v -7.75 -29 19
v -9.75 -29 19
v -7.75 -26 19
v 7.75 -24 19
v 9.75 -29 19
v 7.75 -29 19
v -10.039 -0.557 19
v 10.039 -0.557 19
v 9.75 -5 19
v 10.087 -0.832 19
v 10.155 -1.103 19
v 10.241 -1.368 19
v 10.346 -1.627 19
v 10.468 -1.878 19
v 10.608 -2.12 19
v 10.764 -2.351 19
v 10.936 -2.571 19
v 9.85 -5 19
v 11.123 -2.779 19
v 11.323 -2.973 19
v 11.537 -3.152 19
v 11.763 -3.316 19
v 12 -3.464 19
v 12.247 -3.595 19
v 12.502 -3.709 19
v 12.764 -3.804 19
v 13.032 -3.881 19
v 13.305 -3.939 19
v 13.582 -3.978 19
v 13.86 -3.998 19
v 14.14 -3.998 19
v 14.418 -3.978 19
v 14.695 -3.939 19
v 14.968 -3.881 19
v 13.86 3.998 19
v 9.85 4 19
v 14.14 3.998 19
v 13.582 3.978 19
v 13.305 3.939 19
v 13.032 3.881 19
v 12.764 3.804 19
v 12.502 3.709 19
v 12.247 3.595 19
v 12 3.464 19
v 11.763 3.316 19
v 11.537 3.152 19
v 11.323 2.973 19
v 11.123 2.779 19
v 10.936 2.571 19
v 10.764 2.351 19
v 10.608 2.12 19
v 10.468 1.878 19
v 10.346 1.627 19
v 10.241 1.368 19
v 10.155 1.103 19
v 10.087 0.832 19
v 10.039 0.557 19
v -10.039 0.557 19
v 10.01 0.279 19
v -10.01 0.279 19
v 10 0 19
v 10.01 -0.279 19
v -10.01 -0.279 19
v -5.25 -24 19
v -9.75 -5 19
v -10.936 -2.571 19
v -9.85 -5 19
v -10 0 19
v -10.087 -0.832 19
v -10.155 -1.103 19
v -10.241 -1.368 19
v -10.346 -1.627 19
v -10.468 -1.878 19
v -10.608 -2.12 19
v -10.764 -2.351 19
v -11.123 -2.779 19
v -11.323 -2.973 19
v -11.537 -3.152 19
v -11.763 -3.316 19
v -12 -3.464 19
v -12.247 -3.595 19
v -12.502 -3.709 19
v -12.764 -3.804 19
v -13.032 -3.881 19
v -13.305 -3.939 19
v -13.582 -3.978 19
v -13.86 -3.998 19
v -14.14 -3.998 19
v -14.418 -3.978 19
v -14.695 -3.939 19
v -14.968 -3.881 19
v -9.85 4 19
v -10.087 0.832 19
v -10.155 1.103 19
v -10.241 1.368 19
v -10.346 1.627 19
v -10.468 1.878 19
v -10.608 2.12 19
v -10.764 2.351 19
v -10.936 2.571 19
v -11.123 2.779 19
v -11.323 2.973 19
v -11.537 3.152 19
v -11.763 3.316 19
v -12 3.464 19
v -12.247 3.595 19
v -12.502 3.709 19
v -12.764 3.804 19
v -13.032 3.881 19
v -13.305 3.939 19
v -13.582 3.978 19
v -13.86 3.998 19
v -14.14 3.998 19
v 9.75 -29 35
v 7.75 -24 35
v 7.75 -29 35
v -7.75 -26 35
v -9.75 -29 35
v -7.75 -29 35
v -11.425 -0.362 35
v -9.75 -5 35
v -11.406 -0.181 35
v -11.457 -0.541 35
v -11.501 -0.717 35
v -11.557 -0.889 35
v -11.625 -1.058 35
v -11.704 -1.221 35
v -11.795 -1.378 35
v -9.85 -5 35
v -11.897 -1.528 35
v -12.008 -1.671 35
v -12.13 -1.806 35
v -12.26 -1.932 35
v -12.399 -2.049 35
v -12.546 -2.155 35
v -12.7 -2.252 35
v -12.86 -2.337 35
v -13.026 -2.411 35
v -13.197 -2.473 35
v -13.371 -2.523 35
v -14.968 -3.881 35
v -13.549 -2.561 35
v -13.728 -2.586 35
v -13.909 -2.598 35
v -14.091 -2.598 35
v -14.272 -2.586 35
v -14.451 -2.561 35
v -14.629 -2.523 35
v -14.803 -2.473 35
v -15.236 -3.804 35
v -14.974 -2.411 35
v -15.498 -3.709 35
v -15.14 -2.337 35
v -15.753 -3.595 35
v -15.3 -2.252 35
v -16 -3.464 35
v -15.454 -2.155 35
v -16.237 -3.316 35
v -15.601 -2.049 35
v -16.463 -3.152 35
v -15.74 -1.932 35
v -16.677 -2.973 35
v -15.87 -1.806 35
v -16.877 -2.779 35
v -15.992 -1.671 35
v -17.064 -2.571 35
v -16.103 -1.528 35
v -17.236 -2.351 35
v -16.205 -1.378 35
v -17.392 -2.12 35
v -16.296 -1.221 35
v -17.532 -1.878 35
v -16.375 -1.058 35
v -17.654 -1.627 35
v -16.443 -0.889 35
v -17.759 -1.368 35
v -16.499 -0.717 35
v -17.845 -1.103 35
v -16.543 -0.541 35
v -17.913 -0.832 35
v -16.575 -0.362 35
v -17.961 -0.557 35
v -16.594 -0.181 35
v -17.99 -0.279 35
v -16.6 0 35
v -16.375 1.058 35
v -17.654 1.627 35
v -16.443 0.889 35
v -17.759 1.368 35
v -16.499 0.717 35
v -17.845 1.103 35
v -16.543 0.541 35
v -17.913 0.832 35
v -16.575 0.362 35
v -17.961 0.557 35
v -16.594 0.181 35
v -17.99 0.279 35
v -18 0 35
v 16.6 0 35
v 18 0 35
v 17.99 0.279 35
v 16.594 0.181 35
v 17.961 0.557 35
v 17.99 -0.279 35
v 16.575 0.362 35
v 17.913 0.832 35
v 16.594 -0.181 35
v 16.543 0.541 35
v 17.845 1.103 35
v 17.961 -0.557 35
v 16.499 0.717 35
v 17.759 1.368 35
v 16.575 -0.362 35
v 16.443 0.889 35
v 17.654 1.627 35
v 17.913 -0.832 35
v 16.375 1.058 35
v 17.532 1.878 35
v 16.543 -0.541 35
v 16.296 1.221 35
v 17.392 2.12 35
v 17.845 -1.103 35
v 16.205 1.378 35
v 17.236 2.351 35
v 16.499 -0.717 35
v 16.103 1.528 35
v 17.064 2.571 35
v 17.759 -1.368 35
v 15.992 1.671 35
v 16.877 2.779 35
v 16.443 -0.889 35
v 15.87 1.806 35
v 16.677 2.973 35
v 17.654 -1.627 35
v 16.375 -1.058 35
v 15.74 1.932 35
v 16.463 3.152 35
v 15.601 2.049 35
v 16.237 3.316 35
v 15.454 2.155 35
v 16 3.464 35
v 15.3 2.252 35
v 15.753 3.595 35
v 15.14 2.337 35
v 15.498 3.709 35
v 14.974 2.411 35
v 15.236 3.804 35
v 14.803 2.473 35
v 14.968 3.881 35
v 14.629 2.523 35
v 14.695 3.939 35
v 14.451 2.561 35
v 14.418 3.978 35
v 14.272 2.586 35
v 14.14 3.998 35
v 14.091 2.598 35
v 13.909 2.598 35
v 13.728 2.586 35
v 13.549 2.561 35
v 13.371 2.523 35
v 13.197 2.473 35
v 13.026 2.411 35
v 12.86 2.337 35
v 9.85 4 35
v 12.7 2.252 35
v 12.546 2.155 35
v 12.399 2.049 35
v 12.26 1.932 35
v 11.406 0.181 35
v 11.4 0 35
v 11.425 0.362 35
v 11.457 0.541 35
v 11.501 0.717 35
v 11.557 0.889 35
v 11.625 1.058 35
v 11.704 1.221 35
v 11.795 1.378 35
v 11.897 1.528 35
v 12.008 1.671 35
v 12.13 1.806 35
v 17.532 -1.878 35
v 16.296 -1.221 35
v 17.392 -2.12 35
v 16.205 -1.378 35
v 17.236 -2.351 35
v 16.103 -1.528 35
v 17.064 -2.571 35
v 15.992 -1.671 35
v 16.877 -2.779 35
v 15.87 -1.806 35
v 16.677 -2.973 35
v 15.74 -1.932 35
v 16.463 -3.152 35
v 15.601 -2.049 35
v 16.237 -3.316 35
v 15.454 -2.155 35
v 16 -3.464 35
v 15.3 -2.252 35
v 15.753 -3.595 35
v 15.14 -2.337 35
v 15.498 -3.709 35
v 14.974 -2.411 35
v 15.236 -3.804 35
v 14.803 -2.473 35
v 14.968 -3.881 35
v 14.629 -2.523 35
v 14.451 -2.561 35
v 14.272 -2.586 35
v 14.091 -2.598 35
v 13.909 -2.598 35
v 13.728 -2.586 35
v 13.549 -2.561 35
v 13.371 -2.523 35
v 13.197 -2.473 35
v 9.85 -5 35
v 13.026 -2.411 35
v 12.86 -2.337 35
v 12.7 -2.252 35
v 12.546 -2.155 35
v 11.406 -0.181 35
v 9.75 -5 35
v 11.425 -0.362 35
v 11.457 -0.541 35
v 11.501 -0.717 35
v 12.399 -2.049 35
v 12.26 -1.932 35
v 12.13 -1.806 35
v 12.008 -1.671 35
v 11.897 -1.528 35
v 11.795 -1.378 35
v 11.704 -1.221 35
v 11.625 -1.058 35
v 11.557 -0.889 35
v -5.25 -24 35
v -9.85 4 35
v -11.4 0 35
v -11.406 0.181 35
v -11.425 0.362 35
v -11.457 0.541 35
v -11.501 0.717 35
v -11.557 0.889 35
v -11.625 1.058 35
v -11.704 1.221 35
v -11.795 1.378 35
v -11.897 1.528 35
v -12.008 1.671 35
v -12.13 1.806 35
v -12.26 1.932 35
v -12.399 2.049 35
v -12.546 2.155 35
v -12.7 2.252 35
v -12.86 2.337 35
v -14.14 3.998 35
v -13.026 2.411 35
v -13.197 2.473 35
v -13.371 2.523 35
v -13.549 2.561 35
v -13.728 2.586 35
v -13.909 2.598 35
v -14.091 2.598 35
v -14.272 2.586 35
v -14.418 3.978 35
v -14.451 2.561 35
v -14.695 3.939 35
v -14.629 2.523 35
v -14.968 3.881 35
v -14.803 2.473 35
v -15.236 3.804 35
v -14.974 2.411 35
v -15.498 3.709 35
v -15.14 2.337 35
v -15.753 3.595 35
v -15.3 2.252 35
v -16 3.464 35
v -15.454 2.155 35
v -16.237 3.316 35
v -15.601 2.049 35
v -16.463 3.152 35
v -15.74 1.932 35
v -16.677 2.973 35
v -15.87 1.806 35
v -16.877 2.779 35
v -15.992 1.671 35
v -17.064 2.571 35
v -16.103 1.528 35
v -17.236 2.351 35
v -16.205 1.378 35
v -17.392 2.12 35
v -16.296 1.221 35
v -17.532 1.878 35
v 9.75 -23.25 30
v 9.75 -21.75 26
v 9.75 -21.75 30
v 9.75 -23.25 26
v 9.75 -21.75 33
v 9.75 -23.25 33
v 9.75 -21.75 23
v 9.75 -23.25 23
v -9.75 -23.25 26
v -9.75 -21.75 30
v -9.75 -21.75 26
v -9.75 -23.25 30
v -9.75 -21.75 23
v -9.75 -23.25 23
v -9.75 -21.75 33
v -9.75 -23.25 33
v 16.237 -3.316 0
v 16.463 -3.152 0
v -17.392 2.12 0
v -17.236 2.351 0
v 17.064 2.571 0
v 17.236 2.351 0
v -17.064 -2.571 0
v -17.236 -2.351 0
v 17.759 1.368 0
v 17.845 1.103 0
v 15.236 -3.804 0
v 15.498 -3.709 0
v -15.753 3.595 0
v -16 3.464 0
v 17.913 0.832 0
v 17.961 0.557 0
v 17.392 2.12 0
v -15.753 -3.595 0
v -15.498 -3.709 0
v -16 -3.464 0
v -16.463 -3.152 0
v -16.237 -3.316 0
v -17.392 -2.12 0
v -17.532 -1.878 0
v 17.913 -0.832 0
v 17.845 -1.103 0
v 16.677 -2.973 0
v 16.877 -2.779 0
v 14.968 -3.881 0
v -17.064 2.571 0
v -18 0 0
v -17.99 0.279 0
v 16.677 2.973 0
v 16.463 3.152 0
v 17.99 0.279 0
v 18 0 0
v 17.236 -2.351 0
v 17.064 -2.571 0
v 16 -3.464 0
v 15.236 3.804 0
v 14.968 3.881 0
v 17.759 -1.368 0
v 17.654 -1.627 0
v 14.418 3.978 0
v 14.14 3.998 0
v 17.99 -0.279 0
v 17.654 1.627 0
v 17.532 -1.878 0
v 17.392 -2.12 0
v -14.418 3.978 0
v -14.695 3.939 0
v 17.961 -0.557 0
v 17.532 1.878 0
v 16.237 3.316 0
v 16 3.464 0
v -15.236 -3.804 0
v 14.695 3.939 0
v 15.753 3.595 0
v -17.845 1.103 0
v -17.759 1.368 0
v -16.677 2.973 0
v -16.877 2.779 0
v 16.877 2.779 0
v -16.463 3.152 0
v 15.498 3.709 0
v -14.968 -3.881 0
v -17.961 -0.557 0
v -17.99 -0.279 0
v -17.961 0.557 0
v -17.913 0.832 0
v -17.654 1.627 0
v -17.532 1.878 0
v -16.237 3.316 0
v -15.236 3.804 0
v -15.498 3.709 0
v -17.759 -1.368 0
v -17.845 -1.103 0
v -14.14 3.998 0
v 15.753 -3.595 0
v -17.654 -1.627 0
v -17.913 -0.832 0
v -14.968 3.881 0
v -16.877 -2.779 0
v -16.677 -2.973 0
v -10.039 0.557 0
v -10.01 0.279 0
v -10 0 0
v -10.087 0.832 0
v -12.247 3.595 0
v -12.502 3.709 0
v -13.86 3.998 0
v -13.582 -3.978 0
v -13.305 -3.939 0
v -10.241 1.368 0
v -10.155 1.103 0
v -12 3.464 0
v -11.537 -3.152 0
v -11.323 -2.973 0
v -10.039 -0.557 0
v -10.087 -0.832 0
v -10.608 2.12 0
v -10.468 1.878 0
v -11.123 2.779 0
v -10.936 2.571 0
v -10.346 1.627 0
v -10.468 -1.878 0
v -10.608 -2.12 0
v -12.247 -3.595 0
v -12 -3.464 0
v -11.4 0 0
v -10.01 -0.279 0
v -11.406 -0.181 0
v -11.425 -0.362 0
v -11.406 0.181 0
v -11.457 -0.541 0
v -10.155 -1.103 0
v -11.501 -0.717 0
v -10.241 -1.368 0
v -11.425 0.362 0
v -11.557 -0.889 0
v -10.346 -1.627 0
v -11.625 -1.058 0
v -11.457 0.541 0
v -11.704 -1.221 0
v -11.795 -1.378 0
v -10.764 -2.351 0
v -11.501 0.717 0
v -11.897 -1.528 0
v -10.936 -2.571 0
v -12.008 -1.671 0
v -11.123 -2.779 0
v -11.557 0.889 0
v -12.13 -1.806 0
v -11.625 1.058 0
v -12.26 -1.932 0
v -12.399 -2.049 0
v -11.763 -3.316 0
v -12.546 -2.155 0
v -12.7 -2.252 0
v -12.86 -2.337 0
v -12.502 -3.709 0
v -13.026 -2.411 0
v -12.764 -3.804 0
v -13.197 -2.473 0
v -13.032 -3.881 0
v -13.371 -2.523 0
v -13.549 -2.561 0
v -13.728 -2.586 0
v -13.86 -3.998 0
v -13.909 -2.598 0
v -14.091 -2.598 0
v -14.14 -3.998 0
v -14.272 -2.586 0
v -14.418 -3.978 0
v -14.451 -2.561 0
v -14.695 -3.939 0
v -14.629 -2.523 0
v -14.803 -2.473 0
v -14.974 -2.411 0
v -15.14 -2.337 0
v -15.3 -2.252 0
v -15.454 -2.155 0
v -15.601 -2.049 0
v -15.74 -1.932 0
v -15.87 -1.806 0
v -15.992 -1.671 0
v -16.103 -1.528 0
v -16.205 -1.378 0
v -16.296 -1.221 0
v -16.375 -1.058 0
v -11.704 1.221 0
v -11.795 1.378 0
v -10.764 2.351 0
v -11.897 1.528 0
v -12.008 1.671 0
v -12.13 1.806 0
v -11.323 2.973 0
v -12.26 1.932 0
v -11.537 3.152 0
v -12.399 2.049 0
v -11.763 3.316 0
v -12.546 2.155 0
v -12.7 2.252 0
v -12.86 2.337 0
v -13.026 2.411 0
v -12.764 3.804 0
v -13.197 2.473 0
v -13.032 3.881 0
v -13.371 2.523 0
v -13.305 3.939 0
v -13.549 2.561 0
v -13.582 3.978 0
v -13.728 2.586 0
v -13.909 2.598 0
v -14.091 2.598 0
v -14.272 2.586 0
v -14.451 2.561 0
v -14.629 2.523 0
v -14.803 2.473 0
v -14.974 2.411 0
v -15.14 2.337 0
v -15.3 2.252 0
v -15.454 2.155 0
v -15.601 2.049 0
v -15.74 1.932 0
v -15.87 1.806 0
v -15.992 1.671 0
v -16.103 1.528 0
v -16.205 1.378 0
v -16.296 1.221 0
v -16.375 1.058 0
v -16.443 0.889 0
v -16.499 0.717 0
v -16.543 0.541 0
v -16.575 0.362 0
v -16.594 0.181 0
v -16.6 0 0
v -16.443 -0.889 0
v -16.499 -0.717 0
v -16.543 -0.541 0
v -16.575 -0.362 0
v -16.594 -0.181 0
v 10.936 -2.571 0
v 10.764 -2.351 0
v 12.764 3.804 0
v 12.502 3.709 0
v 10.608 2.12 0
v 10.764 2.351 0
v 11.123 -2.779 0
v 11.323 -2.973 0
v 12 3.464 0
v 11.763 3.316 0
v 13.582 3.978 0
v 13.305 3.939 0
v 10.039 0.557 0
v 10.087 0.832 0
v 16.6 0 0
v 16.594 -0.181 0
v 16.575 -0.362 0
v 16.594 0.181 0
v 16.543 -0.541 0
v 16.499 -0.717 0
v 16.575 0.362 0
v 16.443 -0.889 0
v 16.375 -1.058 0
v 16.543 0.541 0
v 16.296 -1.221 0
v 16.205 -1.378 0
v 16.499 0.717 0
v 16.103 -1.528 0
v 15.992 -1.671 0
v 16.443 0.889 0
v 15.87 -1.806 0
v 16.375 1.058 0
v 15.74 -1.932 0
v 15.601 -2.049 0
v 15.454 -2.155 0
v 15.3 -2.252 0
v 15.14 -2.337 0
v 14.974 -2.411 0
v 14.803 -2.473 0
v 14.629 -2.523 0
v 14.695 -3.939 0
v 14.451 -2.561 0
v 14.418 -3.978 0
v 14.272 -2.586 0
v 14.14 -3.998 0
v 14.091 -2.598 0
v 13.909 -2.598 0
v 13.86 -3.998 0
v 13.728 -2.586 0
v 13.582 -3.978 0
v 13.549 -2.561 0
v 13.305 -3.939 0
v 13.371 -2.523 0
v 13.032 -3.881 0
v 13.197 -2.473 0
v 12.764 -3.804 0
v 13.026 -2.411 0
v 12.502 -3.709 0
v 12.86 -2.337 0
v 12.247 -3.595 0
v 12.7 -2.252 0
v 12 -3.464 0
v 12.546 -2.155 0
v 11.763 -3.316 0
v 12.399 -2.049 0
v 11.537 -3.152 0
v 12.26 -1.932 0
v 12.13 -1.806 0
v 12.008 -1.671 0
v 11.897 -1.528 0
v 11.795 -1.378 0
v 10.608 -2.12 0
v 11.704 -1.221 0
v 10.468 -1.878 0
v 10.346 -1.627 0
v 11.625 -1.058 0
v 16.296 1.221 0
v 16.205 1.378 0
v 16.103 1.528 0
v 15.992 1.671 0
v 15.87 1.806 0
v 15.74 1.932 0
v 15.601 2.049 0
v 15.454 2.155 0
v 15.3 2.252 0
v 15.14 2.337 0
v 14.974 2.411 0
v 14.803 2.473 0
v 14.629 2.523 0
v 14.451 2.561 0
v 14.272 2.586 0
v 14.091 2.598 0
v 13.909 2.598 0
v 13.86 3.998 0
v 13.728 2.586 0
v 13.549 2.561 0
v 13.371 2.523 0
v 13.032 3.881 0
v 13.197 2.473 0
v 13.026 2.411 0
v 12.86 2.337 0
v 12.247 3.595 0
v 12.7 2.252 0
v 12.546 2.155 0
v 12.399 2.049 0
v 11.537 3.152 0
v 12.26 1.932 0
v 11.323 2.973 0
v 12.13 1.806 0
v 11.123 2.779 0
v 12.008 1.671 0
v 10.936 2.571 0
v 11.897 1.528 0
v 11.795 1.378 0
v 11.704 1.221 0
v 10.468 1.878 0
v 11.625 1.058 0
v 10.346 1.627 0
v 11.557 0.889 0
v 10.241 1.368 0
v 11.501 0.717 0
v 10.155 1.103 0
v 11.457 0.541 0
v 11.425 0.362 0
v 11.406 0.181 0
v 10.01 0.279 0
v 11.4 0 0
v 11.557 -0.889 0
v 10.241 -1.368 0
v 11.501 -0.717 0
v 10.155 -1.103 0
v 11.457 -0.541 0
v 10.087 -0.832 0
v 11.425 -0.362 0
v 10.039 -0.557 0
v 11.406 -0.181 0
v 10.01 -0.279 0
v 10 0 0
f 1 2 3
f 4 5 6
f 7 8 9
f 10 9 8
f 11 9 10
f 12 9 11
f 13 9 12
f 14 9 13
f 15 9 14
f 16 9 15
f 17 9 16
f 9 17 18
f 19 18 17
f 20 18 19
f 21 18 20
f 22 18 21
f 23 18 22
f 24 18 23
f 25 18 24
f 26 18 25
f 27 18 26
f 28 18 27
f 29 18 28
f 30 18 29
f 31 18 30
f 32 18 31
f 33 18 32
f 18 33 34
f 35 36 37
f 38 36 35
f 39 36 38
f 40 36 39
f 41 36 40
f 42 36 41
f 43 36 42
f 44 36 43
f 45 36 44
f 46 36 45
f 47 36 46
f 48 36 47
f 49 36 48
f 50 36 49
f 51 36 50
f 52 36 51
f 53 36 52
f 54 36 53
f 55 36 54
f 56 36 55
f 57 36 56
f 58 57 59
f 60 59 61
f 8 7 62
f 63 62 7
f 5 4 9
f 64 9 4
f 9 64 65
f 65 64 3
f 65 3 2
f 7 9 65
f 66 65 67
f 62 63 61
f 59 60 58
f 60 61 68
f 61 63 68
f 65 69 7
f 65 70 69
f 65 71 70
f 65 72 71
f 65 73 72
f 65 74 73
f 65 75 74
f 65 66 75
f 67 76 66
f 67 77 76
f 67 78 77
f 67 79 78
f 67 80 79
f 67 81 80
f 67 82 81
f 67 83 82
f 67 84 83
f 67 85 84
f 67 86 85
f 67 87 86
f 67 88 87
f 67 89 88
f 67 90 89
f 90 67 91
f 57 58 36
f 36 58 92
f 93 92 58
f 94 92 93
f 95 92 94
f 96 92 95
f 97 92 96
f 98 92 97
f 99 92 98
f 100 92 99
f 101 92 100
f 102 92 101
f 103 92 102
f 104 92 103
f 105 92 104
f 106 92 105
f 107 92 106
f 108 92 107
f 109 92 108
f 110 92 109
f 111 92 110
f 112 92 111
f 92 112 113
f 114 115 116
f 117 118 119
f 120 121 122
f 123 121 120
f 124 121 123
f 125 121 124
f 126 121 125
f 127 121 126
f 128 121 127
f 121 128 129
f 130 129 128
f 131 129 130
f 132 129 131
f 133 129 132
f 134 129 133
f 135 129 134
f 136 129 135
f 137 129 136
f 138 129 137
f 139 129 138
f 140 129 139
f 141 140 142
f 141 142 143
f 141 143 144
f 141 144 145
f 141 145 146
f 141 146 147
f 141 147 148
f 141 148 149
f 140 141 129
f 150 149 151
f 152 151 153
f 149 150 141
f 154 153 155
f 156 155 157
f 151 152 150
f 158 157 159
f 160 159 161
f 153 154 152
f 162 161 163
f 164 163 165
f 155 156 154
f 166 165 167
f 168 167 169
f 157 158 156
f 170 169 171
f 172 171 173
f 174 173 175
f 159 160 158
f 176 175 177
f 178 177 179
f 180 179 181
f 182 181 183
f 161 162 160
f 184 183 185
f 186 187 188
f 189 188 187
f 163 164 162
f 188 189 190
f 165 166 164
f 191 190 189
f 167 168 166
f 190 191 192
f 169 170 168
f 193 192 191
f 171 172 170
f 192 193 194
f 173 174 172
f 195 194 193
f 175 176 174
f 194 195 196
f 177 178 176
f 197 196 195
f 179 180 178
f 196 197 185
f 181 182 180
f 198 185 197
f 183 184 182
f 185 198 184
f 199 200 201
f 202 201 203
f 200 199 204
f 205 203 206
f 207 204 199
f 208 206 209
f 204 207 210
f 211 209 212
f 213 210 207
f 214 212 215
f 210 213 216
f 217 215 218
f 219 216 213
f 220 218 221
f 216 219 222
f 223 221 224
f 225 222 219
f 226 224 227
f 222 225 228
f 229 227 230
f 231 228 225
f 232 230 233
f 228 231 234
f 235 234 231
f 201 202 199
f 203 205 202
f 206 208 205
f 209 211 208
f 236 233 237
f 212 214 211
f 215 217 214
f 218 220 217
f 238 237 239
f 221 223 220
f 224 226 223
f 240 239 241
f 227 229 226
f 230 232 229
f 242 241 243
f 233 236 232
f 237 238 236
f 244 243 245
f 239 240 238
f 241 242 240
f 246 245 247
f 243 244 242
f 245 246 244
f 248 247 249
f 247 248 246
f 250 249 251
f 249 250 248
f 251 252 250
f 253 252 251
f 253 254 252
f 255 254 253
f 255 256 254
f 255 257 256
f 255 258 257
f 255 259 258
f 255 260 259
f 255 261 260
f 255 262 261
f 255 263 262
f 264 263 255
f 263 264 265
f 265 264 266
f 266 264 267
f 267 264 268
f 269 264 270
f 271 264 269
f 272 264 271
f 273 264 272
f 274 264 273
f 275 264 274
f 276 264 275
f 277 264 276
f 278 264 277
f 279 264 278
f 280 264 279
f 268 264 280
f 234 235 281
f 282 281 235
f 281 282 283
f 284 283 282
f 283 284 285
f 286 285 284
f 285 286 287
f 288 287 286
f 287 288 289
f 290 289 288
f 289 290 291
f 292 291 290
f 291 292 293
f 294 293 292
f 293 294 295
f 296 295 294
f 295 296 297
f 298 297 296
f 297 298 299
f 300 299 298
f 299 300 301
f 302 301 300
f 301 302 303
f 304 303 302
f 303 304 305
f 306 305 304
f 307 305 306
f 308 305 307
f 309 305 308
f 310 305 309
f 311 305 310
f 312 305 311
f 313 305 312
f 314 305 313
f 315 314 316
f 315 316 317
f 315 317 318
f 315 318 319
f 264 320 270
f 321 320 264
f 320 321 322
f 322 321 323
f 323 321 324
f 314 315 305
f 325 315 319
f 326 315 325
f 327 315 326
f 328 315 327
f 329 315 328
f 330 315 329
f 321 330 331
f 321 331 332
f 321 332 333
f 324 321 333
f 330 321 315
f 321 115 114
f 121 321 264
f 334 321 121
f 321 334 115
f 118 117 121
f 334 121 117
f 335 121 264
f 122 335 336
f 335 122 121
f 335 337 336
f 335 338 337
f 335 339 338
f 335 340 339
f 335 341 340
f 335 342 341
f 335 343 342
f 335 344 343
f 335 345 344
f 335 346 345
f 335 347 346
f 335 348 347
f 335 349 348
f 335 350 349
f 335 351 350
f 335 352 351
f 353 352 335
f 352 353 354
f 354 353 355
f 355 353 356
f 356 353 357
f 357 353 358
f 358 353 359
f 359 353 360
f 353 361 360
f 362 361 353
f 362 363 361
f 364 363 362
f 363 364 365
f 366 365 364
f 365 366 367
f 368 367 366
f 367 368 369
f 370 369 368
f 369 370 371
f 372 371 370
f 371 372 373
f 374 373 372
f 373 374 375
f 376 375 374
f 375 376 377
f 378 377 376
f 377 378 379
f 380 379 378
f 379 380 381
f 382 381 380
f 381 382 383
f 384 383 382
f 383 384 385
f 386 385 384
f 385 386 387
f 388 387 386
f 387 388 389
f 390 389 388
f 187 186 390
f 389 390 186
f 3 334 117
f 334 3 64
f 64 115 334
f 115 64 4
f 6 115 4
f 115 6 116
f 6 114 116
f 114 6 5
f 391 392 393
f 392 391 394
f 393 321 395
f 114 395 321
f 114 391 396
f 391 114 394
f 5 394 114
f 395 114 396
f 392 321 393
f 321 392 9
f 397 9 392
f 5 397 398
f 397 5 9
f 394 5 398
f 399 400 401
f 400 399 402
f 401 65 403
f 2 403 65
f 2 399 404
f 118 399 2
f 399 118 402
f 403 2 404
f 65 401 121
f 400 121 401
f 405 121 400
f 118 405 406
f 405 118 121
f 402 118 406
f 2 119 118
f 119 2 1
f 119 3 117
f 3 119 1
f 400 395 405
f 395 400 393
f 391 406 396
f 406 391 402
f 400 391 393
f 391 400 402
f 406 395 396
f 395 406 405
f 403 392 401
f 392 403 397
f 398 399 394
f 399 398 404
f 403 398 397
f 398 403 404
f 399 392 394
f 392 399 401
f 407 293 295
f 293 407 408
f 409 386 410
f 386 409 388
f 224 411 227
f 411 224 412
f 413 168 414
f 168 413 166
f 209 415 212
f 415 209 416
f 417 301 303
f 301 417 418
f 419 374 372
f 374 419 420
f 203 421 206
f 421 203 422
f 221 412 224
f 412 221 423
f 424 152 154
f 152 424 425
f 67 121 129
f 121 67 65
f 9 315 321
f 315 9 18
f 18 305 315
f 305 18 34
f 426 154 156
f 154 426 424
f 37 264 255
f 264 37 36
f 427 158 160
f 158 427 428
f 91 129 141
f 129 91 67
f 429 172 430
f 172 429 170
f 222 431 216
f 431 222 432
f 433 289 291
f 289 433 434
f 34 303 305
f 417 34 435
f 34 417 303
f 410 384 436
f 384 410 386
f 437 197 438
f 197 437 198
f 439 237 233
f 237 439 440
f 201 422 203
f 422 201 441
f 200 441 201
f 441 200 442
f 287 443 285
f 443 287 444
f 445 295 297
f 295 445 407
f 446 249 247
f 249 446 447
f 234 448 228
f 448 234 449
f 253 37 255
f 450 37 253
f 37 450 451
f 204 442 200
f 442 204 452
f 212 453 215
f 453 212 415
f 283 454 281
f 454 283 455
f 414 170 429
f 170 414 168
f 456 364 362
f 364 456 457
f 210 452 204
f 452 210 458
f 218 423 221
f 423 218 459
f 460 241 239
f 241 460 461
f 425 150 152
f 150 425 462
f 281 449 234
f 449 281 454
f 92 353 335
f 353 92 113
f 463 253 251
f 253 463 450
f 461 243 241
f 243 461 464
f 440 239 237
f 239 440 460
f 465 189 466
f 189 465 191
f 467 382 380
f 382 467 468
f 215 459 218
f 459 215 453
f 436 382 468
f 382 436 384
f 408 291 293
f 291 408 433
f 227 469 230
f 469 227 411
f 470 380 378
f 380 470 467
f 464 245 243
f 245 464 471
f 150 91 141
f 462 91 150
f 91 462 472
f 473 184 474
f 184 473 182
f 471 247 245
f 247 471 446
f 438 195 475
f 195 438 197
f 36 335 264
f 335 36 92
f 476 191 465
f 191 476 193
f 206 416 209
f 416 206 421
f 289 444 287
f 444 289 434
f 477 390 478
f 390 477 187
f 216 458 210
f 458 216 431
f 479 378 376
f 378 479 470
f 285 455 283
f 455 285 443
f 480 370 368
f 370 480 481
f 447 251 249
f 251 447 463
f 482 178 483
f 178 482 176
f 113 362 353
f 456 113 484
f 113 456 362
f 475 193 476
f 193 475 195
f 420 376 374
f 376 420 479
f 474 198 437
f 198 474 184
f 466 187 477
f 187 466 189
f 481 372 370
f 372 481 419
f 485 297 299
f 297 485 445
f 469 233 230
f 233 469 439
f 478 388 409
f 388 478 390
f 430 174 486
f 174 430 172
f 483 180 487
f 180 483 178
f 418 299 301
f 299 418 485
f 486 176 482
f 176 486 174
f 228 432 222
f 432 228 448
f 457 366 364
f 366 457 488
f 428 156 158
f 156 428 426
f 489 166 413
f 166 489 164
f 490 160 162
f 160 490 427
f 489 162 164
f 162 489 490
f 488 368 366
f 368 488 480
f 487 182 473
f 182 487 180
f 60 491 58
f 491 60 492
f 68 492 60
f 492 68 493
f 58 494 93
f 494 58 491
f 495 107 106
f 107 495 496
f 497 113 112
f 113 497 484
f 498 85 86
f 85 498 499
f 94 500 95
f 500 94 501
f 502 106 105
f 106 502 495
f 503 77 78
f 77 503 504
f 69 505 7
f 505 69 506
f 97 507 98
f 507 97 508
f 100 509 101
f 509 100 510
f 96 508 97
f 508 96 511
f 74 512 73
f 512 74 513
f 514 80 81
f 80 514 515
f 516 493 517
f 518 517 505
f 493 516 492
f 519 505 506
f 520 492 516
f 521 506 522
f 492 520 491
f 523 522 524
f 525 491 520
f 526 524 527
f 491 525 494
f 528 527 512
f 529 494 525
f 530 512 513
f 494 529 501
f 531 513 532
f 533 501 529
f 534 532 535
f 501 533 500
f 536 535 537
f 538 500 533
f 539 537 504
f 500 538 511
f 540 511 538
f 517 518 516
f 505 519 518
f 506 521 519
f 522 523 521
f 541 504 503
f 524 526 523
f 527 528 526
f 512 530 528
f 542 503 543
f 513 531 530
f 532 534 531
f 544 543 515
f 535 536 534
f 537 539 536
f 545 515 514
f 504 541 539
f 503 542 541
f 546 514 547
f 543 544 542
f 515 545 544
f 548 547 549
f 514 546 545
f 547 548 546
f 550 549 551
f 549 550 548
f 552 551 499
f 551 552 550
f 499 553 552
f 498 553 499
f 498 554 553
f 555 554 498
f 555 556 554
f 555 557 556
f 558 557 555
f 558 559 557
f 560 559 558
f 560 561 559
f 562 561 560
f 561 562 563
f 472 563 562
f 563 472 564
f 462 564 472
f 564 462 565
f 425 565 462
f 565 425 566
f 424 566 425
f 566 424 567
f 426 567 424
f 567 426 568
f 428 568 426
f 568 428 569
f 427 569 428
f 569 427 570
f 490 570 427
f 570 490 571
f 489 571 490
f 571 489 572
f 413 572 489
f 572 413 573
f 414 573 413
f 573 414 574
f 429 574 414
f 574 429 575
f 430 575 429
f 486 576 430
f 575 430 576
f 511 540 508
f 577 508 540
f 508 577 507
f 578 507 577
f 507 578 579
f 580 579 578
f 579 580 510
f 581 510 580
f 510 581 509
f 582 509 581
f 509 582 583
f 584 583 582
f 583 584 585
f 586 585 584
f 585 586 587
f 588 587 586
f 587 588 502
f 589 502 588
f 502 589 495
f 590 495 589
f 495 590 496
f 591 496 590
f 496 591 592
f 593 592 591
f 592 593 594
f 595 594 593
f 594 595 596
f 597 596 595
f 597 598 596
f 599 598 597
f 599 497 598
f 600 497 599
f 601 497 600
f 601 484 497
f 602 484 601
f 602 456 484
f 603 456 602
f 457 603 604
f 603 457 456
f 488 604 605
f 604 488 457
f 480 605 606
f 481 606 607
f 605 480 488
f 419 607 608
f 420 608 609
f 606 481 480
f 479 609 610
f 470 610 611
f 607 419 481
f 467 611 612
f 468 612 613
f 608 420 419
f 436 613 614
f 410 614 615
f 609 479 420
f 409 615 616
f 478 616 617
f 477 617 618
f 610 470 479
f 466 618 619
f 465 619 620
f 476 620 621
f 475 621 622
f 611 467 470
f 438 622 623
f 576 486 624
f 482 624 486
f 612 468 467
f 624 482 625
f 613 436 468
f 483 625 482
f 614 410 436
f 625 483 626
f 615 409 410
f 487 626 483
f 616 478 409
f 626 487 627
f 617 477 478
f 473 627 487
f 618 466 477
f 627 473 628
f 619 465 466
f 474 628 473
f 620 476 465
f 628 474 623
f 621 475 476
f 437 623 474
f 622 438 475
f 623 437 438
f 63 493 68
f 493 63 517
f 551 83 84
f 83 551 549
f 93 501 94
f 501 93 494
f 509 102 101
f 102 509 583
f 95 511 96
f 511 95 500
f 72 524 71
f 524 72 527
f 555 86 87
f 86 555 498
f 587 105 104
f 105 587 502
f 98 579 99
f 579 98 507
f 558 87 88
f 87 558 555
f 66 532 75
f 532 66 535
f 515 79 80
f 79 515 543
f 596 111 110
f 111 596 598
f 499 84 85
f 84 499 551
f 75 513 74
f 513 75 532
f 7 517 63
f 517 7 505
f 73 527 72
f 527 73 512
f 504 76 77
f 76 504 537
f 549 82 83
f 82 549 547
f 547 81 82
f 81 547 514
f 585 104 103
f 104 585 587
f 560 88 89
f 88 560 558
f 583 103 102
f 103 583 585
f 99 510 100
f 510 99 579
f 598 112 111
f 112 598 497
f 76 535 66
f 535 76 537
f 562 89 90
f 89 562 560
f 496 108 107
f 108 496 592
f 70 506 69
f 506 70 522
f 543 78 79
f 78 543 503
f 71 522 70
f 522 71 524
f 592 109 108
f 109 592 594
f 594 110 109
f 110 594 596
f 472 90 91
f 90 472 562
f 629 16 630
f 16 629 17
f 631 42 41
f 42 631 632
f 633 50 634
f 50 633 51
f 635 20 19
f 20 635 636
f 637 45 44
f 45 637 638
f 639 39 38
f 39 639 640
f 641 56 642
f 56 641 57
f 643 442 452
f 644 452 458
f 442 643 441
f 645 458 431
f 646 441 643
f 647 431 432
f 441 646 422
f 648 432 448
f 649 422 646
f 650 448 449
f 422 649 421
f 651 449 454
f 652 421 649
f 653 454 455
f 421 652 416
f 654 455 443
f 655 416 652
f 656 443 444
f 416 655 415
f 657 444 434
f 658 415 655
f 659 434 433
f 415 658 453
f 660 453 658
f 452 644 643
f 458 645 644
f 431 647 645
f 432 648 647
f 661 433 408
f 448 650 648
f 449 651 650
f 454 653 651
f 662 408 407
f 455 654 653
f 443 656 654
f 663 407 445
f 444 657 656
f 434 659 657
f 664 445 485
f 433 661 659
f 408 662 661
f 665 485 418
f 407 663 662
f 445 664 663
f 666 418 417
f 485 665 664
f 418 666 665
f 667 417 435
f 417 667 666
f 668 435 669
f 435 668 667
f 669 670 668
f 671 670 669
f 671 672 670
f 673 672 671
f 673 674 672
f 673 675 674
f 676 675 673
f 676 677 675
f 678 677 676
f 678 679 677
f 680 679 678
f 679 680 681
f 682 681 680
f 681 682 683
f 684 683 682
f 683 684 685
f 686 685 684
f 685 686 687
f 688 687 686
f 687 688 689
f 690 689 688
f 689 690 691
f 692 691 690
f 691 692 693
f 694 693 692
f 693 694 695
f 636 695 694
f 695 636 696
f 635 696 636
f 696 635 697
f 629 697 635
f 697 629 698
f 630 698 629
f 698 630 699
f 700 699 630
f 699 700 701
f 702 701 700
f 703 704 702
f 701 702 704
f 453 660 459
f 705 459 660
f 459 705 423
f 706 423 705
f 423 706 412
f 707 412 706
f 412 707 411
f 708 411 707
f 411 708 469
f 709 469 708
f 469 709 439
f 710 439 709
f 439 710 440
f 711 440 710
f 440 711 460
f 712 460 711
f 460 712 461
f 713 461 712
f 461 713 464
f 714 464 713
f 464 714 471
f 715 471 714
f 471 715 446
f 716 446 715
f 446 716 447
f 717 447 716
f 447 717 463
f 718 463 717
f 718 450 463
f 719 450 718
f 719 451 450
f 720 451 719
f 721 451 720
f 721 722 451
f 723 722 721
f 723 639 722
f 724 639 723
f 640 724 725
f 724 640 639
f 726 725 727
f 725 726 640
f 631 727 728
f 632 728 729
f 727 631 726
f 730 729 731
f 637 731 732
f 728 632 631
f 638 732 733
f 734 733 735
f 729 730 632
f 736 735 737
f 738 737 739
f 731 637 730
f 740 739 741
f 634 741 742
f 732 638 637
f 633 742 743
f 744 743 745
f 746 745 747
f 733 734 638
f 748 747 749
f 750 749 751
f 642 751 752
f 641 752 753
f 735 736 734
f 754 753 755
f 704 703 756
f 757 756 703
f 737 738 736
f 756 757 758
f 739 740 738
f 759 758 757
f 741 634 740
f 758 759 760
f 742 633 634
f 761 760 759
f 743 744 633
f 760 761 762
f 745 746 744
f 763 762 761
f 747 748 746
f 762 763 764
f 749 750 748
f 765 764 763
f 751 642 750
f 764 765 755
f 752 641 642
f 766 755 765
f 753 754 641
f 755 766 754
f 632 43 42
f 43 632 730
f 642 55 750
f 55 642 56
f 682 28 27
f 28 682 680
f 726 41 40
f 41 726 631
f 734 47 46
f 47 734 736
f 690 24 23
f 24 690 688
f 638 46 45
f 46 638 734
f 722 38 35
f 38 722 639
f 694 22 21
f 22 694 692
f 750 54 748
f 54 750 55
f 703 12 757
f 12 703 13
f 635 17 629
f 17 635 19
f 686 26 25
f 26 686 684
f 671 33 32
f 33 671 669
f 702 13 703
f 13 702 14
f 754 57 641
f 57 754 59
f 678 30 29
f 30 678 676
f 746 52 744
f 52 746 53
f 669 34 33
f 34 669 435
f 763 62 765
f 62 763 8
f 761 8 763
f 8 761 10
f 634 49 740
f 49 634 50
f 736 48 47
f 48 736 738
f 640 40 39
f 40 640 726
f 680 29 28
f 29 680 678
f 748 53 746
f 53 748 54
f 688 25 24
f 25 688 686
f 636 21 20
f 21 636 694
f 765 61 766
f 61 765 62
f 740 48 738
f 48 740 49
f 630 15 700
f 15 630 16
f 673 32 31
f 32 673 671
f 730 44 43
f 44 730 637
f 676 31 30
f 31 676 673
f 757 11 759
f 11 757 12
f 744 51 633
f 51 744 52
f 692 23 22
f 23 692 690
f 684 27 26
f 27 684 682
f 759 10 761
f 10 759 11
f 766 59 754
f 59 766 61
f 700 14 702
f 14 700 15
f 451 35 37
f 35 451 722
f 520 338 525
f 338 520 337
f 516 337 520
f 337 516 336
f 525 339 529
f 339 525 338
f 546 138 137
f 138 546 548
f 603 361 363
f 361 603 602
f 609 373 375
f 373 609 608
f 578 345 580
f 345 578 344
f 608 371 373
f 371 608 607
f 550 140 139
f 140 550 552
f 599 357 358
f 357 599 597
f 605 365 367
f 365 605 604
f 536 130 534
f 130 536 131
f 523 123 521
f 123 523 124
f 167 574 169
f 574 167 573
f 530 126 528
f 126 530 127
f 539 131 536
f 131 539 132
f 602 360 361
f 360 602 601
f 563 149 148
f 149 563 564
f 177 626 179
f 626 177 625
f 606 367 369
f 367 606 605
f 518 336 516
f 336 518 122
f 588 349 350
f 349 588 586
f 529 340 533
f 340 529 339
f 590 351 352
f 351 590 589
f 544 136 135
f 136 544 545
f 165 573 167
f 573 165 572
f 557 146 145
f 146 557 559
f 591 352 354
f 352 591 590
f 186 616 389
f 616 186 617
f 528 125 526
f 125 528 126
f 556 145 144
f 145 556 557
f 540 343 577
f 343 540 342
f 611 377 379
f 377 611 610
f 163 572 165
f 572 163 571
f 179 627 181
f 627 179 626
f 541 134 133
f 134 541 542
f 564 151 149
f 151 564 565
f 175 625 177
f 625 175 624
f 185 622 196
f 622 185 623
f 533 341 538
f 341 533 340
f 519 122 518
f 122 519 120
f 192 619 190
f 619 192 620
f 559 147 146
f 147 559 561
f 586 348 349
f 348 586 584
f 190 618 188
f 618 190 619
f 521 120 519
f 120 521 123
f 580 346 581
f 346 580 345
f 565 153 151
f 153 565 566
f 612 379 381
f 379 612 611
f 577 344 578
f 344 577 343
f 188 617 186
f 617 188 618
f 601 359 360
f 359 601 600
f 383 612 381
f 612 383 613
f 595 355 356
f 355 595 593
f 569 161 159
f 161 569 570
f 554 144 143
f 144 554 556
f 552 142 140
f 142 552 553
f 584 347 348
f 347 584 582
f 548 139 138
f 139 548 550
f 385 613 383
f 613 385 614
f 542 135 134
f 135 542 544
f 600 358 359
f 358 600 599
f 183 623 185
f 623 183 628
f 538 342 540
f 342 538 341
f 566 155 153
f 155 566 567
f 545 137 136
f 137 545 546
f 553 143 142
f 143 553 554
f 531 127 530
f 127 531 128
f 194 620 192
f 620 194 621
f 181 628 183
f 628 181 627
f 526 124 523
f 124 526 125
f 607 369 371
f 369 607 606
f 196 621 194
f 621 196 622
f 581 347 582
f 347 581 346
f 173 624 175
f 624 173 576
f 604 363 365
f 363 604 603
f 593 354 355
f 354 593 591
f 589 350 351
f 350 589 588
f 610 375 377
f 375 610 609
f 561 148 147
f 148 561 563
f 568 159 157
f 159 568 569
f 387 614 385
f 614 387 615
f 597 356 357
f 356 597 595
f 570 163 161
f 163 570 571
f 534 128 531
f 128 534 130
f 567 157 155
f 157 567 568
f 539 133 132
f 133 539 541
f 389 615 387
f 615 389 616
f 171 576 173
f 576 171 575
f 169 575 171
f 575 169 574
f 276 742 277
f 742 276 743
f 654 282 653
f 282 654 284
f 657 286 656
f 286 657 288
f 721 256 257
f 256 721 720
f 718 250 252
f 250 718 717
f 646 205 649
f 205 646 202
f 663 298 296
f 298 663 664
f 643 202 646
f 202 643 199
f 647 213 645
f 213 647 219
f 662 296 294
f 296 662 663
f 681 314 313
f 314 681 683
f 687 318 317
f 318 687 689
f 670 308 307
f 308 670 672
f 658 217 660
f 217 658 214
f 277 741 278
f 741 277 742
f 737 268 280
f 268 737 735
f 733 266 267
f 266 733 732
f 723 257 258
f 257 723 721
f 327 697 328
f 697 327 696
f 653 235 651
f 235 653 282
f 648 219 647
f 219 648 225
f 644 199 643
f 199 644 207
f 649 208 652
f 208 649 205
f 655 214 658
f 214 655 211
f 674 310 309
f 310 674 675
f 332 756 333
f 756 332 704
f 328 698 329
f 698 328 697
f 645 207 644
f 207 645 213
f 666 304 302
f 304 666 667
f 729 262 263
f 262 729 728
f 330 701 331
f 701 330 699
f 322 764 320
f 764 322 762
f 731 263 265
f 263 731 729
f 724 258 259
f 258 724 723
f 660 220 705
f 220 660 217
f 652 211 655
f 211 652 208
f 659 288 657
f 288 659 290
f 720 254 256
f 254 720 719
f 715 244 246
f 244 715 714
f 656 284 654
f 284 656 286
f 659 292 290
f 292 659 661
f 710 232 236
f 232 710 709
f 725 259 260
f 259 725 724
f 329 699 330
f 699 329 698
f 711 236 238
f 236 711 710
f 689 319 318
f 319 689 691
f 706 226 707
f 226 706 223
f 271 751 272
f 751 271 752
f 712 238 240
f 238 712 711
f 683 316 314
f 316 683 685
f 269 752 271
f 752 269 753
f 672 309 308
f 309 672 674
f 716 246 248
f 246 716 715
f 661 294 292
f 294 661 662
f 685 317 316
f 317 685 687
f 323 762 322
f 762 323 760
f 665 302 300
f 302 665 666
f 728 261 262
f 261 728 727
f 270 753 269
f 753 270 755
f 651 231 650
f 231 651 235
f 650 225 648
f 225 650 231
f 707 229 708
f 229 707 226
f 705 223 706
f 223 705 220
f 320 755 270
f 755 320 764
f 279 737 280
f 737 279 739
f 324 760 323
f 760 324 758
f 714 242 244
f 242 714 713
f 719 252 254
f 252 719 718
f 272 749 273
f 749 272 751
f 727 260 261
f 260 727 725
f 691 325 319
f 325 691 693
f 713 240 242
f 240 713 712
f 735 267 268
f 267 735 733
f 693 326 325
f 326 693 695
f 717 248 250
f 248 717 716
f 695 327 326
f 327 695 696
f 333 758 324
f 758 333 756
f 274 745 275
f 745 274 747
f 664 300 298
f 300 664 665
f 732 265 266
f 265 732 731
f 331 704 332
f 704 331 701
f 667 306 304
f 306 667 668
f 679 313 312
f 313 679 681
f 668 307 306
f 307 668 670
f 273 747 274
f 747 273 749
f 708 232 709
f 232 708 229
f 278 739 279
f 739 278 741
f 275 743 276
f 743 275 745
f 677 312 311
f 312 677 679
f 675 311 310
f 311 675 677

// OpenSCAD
$fn = 90*1;

EPS = 0.1*1;
WAND = 2*1;


CABLE_TIE_WIDTH = 3*1;
CABLE_TIE_THICK = 1.5*1;

// Inner diameter of standoffs
STANDOFF_DIAMETER = 5; // [3:6]
STANDOFF_DIA = STANDOFF_DIAMETER + 0.2;

// Outer diameter of standoffs
STANDOFF_OUTER_DIAMETER = STANDOFF_DIAMETER + 3;

// Length of standoffs
STANDOFF_LENGTH = 35; // [16:60]

// Distance between standoffs (middle to middle)
STANDOFF_DISTANCE = 28; // [15:50]

// Distance from middle of standoffs to XT60 connector
DISTANCE_STANDOFF_XT60 = 21; // [5:30]

XT60_WIDTH = 15.5*1;
XT60_HEIGHT = 8*1;
XT60_DEPTH = 16*1;


SHIFT = 0*1;

difference() {
	union() {
		translate([0, -DISTANCE_STANDOFF_XT60, STANDOFF_LENGTH - XT60_DEPTH])
			translate([0, -XT60_HEIGHT,  XT60_DEPTH])
				rotate([-90,0,0])
					xt60();
		// laschen
		hull() {
			hull() {
				translate([-STANDOFF_DISTANCE/2 - SHIFT, 0, STANDOFF_LENGTH - XT60_DEPTH])
					cylinder(d = STANDOFF_OUTER_DIAMETER, h = XT60_DEPTH);
				translate([-XT60_WIDTH/2 - WAND - EPS, -5, STANDOFF_LENGTH - XT60_DEPTH])
					cube([EPS, 5 + STANDOFF_OUTER_DIAMETER/2, XT60_DEPTH]);
			}
			hull() {
			translate([STANDOFF_DISTANCE/2 - SHIFT, 0, STANDOFF_LENGTH - XT60_DEPTH])
					cylinder(d = STANDOFF_OUTER_DIAMETER, h = XT60_DEPTH);
				translate([XT60_WIDTH/2 + WAND, -5, STANDOFF_LENGTH - XT60_DEPTH])
					cube([EPS, 5 + STANDOFF_OUTER_DIAMETER/2, XT60_DEPTH]);
			}
		}
		translate([-XT60_WIDTH/2 - WAND, -DISTANCE_STANDOFF_XT60, STANDOFF_LENGTH - XT60_DEPTH])
			cube([XT60_WIDTH+2*WAND, DISTANCE_STANDOFF_XT60 - 5, XT60_DEPTH]);
		// standoff pillars
		translate([-STANDOFF_DISTANCE/2 - SHIFT, 0, 0])
			cylinder(d = STANDOFF_OUTER_DIAMETER, h = STANDOFF_LENGTH);
		translate([STANDOFF_DISTANCE/2 - SHIFT, 0, 0])
			cylinder(d = STANDOFF_OUTER_DIAMETER, h = STANDOFF_LENGTH);
	}
	// holes standoffs
	translate([-STANDOFF_DISTANCE/2 - SHIFT, 0, -EPS])
		cylinder(d = STANDOFF_DIA, h = STANDOFF_LENGTH + 2*EPS);
	translate([STANDOFF_DISTANCE/2 - SHIFT, 0, -EPS])
		cylinder(d = STANDOFF_DIA, h = STANDOFF_LENGTH + 2*EPS);
}
			
module xt60() {
	difference() {
		// XT60 body
		translate([-(XT60_WIDTH + 2*WAND)/2, XT60_DEPTH, 0])
			rotate([90, 0, 0])
				linear_extrude(height = 16, center = false, convexity = 10, twist = 0)
					polygon(points=[[0, 8], [19.5, 8], [19.5, 0], [17.5, 0], [17.5, 5], [4.5, 5], [2, 3], [2, 0], [0, 0]]);
		// cable tie holes
		translate([-XT60_WIDTH/2 - WAND - EPS, 2, 8-1.5/2-1.5])
			cube([XT60_WIDTH + 2*WAND + 2*EPS, CABLE_TIE_WIDTH, CABLE_TIE_THICK]);
		translate([-XT60_WIDTH/2 - WAND - EPS, 9, 8-1.5/2-1.5])
			cube([XT60_WIDTH + 2*WAND + 2*EPS, CABLE_TIE_WIDTH, CABLE_TIE_THICK]);
	}

}
